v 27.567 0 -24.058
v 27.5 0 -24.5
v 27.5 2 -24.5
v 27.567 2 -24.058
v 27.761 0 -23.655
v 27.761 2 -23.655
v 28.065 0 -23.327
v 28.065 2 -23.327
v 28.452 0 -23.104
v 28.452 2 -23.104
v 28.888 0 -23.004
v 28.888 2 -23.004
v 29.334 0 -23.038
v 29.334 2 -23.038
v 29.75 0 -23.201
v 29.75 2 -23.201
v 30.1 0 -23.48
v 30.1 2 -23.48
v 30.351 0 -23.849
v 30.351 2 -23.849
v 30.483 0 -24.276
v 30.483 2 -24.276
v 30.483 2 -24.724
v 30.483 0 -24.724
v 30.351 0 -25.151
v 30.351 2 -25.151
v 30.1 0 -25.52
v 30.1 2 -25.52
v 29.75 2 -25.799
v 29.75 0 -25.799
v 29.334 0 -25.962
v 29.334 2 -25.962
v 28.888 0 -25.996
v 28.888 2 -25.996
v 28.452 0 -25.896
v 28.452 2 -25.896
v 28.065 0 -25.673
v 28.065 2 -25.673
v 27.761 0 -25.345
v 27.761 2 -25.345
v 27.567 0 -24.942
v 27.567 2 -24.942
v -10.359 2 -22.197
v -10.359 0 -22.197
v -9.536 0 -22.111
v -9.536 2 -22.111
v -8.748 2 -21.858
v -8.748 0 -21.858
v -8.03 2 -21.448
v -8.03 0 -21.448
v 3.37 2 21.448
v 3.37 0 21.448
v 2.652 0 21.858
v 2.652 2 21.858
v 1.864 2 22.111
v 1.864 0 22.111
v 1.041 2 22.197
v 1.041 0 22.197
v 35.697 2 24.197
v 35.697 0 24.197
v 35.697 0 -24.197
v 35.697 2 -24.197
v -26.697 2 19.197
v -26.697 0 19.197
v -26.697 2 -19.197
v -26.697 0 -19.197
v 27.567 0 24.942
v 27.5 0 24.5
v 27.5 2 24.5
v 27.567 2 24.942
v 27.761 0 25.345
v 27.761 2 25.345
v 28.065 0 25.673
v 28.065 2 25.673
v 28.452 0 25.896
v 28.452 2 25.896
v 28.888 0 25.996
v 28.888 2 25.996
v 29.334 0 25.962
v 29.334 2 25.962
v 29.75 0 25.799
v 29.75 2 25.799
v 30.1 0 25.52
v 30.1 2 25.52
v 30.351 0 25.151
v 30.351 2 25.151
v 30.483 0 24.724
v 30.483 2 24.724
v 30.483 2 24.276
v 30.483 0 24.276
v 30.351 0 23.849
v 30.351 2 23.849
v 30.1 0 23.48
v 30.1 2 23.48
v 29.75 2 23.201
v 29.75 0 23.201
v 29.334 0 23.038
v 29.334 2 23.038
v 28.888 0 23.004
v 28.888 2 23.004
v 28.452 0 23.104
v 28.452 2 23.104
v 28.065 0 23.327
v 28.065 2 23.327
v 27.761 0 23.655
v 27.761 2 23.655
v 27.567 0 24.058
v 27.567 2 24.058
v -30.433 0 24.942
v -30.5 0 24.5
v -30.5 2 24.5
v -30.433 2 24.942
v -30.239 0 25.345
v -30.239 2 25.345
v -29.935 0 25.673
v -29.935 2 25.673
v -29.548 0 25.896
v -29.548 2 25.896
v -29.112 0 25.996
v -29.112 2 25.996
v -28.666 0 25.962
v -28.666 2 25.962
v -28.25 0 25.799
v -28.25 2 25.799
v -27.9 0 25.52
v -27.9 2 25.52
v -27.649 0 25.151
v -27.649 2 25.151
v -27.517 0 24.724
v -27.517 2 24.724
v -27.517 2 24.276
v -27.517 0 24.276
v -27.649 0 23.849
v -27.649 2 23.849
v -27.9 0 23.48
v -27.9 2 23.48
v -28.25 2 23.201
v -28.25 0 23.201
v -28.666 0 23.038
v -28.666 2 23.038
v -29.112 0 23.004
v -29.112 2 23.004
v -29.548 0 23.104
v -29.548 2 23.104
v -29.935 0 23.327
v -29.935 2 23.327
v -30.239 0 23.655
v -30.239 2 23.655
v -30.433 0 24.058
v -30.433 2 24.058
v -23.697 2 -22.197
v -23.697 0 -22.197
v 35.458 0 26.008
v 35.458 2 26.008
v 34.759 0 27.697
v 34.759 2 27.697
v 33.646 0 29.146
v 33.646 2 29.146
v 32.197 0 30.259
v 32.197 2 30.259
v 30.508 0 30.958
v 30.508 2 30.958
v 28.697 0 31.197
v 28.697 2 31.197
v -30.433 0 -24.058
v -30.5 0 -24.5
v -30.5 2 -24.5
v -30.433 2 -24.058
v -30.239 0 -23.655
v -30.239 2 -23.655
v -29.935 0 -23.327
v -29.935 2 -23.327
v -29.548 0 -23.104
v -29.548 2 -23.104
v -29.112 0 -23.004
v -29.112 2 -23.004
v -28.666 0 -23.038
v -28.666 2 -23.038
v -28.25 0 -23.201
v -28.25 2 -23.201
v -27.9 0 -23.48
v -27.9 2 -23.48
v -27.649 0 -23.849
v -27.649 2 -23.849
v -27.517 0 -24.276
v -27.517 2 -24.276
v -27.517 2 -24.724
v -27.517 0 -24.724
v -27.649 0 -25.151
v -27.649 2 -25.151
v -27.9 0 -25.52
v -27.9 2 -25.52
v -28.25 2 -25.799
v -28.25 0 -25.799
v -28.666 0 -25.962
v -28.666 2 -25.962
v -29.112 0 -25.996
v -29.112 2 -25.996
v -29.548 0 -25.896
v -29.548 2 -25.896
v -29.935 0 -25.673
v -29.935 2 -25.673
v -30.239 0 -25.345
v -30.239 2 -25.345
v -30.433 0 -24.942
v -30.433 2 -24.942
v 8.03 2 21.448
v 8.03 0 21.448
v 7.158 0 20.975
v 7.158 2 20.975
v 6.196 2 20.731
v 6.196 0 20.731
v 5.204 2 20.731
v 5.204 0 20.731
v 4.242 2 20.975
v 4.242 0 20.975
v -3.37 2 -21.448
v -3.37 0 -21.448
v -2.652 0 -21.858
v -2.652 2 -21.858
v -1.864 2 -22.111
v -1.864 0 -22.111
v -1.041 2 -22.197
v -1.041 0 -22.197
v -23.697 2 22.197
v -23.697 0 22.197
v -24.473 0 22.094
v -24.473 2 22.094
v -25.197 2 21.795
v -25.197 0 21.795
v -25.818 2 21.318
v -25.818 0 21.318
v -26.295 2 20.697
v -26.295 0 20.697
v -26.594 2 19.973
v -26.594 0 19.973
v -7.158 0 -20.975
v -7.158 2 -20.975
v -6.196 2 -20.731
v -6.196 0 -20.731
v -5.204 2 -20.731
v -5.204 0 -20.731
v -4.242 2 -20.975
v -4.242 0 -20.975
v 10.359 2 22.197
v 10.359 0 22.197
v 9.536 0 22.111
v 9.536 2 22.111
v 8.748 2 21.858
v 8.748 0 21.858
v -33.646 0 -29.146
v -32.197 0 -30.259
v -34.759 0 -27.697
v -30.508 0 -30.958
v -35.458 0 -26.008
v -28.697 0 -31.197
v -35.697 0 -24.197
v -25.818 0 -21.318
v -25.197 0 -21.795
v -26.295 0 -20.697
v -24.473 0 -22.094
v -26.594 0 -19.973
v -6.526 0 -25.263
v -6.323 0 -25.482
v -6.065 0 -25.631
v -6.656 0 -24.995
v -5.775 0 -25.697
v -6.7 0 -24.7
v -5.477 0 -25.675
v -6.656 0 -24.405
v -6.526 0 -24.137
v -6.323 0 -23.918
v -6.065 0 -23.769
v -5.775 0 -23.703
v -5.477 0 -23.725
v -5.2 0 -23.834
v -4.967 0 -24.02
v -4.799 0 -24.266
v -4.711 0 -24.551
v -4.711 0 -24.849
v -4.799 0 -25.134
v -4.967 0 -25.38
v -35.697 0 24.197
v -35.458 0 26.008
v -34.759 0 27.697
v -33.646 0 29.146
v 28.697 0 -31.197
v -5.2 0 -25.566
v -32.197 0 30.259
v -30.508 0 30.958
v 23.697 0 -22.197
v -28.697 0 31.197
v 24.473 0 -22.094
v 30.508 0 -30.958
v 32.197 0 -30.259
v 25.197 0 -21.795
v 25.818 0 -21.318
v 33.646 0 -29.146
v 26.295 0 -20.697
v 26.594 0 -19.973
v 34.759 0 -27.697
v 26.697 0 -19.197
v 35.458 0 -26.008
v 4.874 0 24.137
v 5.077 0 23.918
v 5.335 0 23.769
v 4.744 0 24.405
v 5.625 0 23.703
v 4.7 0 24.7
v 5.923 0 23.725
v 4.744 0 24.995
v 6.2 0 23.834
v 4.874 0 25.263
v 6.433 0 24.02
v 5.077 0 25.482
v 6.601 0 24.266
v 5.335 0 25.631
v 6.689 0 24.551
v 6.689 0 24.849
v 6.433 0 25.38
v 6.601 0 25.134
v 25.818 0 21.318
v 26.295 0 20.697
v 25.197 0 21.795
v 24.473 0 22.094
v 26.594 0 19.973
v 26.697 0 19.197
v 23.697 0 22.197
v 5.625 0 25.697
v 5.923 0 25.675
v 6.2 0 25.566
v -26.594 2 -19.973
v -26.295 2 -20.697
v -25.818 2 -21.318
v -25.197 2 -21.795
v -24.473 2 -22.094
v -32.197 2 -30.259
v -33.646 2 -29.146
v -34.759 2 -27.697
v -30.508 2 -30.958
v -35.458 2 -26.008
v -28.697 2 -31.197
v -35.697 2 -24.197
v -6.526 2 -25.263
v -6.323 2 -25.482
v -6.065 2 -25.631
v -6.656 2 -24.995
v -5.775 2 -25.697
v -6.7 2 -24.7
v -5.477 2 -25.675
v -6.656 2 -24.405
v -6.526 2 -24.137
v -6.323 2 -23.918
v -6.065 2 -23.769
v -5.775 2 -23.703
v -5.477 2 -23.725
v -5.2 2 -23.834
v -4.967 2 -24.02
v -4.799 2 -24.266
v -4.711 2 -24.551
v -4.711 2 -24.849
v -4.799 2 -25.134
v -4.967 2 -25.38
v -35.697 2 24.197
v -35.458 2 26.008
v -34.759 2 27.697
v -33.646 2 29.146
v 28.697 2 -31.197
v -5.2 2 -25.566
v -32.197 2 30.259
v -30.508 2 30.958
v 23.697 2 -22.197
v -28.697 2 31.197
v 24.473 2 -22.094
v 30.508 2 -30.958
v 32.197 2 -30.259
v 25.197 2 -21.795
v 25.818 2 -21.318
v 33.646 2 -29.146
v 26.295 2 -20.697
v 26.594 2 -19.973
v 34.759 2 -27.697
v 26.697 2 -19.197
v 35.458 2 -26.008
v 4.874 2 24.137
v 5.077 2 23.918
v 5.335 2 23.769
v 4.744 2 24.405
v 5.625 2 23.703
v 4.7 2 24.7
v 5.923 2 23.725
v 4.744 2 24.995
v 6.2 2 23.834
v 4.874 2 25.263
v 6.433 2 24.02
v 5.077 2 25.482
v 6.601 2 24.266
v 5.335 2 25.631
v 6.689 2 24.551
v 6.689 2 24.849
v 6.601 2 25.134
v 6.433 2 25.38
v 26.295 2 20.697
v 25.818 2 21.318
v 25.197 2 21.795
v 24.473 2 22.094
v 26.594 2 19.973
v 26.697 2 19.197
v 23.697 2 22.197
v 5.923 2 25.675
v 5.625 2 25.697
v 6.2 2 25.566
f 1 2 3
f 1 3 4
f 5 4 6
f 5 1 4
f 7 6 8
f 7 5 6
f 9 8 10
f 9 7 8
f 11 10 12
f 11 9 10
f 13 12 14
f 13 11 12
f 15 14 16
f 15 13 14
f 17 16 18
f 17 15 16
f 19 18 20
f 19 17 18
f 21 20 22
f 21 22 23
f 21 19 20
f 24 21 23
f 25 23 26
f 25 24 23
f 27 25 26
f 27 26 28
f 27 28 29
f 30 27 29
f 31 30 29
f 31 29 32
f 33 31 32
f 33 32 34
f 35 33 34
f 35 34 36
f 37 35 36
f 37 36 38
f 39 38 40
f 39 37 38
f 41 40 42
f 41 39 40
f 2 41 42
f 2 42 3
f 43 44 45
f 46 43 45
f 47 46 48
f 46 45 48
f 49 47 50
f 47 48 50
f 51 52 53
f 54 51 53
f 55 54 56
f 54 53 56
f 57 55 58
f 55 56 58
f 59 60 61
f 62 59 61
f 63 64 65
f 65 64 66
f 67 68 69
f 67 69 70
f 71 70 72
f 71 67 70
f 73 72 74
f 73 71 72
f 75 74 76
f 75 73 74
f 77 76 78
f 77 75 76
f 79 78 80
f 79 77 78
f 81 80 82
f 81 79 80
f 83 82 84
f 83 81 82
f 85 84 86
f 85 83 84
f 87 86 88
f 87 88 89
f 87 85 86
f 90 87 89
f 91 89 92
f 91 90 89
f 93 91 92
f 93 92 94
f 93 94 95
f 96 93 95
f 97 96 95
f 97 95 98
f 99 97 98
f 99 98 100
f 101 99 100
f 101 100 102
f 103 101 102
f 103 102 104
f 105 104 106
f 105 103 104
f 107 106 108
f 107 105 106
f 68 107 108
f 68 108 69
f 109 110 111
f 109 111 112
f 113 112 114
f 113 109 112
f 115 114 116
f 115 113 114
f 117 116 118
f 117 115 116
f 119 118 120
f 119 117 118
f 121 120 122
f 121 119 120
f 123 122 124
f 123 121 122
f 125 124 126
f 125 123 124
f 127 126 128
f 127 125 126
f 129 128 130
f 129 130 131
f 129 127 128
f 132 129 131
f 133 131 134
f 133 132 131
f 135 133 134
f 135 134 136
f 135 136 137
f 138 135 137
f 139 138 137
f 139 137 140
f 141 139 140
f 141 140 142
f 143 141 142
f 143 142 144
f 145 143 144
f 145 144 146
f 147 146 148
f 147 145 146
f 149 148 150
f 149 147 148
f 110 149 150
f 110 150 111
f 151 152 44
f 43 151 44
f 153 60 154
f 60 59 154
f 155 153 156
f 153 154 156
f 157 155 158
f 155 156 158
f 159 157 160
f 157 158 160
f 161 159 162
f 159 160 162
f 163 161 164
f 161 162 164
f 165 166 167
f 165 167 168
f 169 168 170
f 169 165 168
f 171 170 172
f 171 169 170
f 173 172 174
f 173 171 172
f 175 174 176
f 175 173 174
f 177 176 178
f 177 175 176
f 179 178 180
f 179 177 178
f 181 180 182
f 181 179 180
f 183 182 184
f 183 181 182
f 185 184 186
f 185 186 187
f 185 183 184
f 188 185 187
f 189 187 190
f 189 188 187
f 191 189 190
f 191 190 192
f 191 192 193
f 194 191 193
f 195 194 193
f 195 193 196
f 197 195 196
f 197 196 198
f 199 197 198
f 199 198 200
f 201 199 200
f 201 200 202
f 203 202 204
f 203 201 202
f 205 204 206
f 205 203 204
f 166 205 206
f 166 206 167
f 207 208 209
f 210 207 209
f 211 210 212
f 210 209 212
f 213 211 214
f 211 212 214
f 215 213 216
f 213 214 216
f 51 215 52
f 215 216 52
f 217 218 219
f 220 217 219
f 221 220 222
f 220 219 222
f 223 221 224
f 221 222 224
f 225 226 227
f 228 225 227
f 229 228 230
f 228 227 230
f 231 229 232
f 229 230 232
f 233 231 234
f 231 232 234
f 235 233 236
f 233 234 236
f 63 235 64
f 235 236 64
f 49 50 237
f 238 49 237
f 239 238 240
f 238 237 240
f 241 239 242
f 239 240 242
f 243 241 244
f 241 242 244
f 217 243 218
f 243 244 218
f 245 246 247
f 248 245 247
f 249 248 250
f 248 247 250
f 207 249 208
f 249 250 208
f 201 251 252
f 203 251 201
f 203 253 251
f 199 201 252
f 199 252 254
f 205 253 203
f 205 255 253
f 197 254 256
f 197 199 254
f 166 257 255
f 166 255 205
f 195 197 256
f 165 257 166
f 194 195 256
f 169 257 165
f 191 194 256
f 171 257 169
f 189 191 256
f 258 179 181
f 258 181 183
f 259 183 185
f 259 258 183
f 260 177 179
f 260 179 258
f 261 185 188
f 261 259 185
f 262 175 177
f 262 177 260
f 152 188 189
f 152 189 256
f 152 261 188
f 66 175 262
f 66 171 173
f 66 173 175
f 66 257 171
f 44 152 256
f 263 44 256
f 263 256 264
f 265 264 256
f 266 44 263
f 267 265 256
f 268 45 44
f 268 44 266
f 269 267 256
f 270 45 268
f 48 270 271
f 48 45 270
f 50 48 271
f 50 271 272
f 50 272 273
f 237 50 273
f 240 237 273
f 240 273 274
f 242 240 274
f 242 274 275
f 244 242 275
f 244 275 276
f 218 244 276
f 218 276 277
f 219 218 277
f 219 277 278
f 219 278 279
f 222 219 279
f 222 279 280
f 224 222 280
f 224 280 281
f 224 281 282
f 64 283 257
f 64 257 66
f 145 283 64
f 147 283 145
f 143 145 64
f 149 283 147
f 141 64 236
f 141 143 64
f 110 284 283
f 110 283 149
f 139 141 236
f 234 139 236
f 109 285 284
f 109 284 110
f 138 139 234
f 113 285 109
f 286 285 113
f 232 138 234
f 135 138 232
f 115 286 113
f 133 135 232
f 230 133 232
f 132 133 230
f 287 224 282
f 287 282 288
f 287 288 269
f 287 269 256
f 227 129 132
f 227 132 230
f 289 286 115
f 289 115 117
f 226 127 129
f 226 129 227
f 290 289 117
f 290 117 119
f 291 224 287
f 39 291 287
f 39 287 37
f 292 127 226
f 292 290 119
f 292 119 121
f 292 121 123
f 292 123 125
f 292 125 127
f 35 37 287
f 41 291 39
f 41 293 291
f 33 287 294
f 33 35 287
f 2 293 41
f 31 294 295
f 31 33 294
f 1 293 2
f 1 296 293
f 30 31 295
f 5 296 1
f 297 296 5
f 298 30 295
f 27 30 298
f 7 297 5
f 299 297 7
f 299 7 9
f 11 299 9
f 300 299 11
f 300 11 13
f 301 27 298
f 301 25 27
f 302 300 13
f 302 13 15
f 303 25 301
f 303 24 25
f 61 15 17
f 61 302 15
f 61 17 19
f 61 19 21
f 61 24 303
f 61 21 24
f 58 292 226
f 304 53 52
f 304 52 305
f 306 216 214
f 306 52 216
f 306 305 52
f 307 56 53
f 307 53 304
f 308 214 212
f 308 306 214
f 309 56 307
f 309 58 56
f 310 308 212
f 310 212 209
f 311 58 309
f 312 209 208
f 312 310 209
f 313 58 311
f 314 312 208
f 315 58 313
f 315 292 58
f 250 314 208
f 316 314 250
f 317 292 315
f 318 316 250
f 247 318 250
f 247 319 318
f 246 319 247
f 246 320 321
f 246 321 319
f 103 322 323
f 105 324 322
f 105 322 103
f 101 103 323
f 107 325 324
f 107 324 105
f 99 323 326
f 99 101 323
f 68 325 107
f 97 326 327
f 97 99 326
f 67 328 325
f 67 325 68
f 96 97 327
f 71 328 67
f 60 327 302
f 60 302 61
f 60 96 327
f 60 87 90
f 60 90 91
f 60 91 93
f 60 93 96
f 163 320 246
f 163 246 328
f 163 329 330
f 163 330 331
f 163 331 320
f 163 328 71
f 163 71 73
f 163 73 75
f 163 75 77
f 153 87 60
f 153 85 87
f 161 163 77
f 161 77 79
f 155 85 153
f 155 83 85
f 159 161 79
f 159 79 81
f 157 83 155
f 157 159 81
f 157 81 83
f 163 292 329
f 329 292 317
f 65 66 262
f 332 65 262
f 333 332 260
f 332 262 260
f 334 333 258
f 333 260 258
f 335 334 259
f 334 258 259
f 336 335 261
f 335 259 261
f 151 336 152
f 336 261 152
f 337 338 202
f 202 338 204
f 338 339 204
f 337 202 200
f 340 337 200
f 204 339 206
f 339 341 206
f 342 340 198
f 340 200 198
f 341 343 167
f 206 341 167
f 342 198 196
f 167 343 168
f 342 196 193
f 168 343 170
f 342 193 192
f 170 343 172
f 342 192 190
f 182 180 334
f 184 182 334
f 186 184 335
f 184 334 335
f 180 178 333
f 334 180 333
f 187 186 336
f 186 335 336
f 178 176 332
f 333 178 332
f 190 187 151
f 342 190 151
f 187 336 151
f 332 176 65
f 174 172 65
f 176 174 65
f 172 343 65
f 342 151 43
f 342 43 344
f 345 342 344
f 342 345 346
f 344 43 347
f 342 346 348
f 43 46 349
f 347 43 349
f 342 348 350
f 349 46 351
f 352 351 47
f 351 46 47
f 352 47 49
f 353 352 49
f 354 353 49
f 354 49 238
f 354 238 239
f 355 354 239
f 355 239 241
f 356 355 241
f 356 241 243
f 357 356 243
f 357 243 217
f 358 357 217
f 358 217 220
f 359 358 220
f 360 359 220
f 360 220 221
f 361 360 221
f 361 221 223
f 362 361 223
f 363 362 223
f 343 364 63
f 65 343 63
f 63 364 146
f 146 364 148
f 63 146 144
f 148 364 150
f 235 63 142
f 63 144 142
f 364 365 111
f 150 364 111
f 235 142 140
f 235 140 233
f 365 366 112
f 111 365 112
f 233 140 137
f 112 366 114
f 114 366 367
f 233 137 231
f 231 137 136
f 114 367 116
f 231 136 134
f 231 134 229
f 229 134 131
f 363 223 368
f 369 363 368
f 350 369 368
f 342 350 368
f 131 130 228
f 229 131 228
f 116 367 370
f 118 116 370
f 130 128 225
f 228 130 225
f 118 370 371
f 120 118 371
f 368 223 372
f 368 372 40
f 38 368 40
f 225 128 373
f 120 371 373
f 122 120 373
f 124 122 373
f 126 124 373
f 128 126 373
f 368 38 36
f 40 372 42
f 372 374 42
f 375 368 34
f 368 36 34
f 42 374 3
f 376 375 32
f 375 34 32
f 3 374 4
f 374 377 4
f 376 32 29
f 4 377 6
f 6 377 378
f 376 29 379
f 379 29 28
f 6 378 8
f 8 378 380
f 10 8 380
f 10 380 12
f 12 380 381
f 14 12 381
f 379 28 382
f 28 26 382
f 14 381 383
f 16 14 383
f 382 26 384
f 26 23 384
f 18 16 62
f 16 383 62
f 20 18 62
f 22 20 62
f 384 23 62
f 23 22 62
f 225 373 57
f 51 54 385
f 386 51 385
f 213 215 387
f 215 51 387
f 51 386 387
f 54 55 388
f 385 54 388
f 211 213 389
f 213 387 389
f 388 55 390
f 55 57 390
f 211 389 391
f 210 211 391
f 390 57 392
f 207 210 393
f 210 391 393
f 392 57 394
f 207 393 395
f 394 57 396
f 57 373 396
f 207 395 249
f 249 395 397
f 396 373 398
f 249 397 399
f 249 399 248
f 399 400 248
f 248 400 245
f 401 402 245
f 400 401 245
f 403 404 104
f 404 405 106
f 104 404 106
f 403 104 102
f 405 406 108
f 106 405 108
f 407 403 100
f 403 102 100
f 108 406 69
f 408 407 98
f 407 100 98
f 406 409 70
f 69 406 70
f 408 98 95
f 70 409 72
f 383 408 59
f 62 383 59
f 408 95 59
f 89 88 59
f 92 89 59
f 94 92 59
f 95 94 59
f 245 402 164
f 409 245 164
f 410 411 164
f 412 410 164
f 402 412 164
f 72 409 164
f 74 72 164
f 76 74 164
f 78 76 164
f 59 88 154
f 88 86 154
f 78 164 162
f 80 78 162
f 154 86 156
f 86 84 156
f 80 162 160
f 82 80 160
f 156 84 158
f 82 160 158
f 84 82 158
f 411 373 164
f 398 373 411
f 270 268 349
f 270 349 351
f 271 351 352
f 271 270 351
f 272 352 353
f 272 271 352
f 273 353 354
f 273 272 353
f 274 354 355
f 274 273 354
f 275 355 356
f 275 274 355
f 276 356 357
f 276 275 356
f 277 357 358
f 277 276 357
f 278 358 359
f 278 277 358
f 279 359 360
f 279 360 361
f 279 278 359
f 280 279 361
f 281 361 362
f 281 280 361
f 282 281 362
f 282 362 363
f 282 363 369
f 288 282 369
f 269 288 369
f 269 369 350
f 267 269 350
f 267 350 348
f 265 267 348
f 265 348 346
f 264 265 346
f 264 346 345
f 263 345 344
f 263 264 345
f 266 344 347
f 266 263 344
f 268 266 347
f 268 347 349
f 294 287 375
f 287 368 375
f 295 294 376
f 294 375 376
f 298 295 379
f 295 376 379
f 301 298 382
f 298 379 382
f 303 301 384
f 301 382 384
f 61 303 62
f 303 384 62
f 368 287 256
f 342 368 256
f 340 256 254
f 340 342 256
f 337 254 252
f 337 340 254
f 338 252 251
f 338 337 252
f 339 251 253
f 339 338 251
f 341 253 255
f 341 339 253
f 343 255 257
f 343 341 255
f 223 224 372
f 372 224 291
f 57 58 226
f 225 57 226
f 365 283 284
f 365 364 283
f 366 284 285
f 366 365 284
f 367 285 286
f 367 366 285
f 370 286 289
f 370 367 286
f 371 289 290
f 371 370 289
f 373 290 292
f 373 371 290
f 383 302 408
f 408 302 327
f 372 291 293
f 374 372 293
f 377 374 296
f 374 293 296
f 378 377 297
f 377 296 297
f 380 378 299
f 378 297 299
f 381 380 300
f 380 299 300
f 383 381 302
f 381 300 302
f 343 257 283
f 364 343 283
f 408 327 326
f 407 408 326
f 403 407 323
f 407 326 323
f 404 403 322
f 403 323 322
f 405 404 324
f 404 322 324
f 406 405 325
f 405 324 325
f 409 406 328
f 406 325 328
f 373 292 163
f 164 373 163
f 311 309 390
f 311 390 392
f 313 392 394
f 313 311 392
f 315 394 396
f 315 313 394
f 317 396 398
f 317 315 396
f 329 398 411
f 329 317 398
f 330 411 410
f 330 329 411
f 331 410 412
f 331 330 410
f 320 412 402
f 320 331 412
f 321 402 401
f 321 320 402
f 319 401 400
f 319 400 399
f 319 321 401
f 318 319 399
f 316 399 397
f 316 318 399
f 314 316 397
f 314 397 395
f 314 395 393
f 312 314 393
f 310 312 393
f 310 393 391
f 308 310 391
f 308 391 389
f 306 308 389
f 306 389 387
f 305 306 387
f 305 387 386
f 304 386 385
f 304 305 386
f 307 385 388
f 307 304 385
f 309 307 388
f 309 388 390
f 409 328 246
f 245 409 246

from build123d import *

# Parameters (mm, degrees)
SKETCH_2_R      = 1.5
SKETCH_2_R_2    = 1
EXTRUDE_1_DEPTH = 2
FILLET_1_R      = 7


with BuildPart() as part:
    # 草圖2 → 填料-伸長1 (new body)
    with BuildSketch(Plane(origin=(0, 0, 0), x_dir=(-1, 0, 0), z_dir=(0, 1, 0))):
        Polygon((23.696699141, -31.196699141), (-23.696699141, -31.196699141), (-35.696699141, -31.196699141), (-35.696699141, -19.196699141), (-35.696699141, 19.196699141), (-35.696699141, 31.196699141), (-23.696699141, 31.196699141), (23.696699141, 31.196699141), (35.696699141, 31.196699141), (35.696699141, 19.196699141), (35.696699141, -19.196699141), (35.696699141, -31.196699141), align=None)
        with Locations((29, 24.5)):
            Circle(SKETCH_2_R, mode=Mode.SUBTRACT)
        with Locations((29, -24.5)):
            Circle(SKETCH_2_R, mode=Mode.SUBTRACT)
        with Locations((-29, 24.5)):
            Circle(SKETCH_2_R, mode=Mode.SUBTRACT)
        with Locations((-29, -24.5)):
            Circle(SKETCH_2_R, mode=Mode.SUBTRACT)
        with Locations((5.699998849, -24.700000266)):
            Circle(SKETCH_2_R_2, mode=Mode.SUBTRACT)
        with Locations((-5.700001151, 24.699999734)):
            Circle(SKETCH_2_R_2, mode=Mode.SUBTRACT)
        with BuildLine():
            Line((23.696699141, -22.196699141), (10.359084004, -22.196699141))
            ThreePointArc((10.359084004, -22.196699141), (9.135687554, -22.005019128), (8.029541427, -21.448349703))
            ThreePointArc((8.029541427, -21.448349703), (5.699998849, -20.700000266), (3.370456271, -21.448349703))
            ThreePointArc((3.370456271, -21.448349703), (2.264310144, -22.005019128), (1.040913694, -22.196699141))
            Line((1.040913694, -22.196699141), (-23.696699141, -22.196699141))
            ThreePointArc((-23.696699141, -22.196699141), (-25.818019485, -21.318019485), (-26.696699141, -19.196699141))
            Line((-26.696699141, -19.196699141), (-26.696699141, 19.196699141))
            ThreePointArc((-26.696699141, 19.196699141), (-25.818019485, 21.318019485), (-23.696699141, 22.196699141))
            Line((-23.696699141, 22.196699141), (-10.359087048, 22.196699141))
            ThreePointArc((-10.359087048, 22.196699141), (-9.13569038, 22.005019059), (-8.029544099, 21.448349438))
            ThreePointArc((-8.029544099, 21.448349438), (-5.700001151, 20.699999734), (-3.370458203, 21.448349438))
            ThreePointArc((-3.370458203, 21.448349438), (-2.264311922, 22.005019059), (-1.040915254, 22.196699141))
            Line((-1.040915254, 22.196699141), (23.696699141, 22.196699141))
            ThreePointArc((23.696699141, 22.196699141), (25.818019485, 21.318019485), (26.696699141, 19.196699141))
            Line((26.696699141, 19.196699141), (26.696699141, -19.196699141))
            ThreePointArc((26.696699141, -19.196699141), (25.818019485, -21.318019485), (23.696699141, -22.196699141))
        make_face(mode=Mode.SUBTRACT)
    extrude(amount=EXTRUDE_1_DEPTH)

    # 圓角1
    fillet_1_edges = [part.edges().sort_by_distance(p)[0] for p in [
        (35.696699141, 1, -31.196699141),
        (35.696699141, 1, 31.196699141),
        (-35.696699141, 1, 31.196699141),
        (-35.696699141, 1, -31.196699141),
    ]]
    fillet(fillet_1_edges, radius=FILLET_1_R)


solid = part.part
